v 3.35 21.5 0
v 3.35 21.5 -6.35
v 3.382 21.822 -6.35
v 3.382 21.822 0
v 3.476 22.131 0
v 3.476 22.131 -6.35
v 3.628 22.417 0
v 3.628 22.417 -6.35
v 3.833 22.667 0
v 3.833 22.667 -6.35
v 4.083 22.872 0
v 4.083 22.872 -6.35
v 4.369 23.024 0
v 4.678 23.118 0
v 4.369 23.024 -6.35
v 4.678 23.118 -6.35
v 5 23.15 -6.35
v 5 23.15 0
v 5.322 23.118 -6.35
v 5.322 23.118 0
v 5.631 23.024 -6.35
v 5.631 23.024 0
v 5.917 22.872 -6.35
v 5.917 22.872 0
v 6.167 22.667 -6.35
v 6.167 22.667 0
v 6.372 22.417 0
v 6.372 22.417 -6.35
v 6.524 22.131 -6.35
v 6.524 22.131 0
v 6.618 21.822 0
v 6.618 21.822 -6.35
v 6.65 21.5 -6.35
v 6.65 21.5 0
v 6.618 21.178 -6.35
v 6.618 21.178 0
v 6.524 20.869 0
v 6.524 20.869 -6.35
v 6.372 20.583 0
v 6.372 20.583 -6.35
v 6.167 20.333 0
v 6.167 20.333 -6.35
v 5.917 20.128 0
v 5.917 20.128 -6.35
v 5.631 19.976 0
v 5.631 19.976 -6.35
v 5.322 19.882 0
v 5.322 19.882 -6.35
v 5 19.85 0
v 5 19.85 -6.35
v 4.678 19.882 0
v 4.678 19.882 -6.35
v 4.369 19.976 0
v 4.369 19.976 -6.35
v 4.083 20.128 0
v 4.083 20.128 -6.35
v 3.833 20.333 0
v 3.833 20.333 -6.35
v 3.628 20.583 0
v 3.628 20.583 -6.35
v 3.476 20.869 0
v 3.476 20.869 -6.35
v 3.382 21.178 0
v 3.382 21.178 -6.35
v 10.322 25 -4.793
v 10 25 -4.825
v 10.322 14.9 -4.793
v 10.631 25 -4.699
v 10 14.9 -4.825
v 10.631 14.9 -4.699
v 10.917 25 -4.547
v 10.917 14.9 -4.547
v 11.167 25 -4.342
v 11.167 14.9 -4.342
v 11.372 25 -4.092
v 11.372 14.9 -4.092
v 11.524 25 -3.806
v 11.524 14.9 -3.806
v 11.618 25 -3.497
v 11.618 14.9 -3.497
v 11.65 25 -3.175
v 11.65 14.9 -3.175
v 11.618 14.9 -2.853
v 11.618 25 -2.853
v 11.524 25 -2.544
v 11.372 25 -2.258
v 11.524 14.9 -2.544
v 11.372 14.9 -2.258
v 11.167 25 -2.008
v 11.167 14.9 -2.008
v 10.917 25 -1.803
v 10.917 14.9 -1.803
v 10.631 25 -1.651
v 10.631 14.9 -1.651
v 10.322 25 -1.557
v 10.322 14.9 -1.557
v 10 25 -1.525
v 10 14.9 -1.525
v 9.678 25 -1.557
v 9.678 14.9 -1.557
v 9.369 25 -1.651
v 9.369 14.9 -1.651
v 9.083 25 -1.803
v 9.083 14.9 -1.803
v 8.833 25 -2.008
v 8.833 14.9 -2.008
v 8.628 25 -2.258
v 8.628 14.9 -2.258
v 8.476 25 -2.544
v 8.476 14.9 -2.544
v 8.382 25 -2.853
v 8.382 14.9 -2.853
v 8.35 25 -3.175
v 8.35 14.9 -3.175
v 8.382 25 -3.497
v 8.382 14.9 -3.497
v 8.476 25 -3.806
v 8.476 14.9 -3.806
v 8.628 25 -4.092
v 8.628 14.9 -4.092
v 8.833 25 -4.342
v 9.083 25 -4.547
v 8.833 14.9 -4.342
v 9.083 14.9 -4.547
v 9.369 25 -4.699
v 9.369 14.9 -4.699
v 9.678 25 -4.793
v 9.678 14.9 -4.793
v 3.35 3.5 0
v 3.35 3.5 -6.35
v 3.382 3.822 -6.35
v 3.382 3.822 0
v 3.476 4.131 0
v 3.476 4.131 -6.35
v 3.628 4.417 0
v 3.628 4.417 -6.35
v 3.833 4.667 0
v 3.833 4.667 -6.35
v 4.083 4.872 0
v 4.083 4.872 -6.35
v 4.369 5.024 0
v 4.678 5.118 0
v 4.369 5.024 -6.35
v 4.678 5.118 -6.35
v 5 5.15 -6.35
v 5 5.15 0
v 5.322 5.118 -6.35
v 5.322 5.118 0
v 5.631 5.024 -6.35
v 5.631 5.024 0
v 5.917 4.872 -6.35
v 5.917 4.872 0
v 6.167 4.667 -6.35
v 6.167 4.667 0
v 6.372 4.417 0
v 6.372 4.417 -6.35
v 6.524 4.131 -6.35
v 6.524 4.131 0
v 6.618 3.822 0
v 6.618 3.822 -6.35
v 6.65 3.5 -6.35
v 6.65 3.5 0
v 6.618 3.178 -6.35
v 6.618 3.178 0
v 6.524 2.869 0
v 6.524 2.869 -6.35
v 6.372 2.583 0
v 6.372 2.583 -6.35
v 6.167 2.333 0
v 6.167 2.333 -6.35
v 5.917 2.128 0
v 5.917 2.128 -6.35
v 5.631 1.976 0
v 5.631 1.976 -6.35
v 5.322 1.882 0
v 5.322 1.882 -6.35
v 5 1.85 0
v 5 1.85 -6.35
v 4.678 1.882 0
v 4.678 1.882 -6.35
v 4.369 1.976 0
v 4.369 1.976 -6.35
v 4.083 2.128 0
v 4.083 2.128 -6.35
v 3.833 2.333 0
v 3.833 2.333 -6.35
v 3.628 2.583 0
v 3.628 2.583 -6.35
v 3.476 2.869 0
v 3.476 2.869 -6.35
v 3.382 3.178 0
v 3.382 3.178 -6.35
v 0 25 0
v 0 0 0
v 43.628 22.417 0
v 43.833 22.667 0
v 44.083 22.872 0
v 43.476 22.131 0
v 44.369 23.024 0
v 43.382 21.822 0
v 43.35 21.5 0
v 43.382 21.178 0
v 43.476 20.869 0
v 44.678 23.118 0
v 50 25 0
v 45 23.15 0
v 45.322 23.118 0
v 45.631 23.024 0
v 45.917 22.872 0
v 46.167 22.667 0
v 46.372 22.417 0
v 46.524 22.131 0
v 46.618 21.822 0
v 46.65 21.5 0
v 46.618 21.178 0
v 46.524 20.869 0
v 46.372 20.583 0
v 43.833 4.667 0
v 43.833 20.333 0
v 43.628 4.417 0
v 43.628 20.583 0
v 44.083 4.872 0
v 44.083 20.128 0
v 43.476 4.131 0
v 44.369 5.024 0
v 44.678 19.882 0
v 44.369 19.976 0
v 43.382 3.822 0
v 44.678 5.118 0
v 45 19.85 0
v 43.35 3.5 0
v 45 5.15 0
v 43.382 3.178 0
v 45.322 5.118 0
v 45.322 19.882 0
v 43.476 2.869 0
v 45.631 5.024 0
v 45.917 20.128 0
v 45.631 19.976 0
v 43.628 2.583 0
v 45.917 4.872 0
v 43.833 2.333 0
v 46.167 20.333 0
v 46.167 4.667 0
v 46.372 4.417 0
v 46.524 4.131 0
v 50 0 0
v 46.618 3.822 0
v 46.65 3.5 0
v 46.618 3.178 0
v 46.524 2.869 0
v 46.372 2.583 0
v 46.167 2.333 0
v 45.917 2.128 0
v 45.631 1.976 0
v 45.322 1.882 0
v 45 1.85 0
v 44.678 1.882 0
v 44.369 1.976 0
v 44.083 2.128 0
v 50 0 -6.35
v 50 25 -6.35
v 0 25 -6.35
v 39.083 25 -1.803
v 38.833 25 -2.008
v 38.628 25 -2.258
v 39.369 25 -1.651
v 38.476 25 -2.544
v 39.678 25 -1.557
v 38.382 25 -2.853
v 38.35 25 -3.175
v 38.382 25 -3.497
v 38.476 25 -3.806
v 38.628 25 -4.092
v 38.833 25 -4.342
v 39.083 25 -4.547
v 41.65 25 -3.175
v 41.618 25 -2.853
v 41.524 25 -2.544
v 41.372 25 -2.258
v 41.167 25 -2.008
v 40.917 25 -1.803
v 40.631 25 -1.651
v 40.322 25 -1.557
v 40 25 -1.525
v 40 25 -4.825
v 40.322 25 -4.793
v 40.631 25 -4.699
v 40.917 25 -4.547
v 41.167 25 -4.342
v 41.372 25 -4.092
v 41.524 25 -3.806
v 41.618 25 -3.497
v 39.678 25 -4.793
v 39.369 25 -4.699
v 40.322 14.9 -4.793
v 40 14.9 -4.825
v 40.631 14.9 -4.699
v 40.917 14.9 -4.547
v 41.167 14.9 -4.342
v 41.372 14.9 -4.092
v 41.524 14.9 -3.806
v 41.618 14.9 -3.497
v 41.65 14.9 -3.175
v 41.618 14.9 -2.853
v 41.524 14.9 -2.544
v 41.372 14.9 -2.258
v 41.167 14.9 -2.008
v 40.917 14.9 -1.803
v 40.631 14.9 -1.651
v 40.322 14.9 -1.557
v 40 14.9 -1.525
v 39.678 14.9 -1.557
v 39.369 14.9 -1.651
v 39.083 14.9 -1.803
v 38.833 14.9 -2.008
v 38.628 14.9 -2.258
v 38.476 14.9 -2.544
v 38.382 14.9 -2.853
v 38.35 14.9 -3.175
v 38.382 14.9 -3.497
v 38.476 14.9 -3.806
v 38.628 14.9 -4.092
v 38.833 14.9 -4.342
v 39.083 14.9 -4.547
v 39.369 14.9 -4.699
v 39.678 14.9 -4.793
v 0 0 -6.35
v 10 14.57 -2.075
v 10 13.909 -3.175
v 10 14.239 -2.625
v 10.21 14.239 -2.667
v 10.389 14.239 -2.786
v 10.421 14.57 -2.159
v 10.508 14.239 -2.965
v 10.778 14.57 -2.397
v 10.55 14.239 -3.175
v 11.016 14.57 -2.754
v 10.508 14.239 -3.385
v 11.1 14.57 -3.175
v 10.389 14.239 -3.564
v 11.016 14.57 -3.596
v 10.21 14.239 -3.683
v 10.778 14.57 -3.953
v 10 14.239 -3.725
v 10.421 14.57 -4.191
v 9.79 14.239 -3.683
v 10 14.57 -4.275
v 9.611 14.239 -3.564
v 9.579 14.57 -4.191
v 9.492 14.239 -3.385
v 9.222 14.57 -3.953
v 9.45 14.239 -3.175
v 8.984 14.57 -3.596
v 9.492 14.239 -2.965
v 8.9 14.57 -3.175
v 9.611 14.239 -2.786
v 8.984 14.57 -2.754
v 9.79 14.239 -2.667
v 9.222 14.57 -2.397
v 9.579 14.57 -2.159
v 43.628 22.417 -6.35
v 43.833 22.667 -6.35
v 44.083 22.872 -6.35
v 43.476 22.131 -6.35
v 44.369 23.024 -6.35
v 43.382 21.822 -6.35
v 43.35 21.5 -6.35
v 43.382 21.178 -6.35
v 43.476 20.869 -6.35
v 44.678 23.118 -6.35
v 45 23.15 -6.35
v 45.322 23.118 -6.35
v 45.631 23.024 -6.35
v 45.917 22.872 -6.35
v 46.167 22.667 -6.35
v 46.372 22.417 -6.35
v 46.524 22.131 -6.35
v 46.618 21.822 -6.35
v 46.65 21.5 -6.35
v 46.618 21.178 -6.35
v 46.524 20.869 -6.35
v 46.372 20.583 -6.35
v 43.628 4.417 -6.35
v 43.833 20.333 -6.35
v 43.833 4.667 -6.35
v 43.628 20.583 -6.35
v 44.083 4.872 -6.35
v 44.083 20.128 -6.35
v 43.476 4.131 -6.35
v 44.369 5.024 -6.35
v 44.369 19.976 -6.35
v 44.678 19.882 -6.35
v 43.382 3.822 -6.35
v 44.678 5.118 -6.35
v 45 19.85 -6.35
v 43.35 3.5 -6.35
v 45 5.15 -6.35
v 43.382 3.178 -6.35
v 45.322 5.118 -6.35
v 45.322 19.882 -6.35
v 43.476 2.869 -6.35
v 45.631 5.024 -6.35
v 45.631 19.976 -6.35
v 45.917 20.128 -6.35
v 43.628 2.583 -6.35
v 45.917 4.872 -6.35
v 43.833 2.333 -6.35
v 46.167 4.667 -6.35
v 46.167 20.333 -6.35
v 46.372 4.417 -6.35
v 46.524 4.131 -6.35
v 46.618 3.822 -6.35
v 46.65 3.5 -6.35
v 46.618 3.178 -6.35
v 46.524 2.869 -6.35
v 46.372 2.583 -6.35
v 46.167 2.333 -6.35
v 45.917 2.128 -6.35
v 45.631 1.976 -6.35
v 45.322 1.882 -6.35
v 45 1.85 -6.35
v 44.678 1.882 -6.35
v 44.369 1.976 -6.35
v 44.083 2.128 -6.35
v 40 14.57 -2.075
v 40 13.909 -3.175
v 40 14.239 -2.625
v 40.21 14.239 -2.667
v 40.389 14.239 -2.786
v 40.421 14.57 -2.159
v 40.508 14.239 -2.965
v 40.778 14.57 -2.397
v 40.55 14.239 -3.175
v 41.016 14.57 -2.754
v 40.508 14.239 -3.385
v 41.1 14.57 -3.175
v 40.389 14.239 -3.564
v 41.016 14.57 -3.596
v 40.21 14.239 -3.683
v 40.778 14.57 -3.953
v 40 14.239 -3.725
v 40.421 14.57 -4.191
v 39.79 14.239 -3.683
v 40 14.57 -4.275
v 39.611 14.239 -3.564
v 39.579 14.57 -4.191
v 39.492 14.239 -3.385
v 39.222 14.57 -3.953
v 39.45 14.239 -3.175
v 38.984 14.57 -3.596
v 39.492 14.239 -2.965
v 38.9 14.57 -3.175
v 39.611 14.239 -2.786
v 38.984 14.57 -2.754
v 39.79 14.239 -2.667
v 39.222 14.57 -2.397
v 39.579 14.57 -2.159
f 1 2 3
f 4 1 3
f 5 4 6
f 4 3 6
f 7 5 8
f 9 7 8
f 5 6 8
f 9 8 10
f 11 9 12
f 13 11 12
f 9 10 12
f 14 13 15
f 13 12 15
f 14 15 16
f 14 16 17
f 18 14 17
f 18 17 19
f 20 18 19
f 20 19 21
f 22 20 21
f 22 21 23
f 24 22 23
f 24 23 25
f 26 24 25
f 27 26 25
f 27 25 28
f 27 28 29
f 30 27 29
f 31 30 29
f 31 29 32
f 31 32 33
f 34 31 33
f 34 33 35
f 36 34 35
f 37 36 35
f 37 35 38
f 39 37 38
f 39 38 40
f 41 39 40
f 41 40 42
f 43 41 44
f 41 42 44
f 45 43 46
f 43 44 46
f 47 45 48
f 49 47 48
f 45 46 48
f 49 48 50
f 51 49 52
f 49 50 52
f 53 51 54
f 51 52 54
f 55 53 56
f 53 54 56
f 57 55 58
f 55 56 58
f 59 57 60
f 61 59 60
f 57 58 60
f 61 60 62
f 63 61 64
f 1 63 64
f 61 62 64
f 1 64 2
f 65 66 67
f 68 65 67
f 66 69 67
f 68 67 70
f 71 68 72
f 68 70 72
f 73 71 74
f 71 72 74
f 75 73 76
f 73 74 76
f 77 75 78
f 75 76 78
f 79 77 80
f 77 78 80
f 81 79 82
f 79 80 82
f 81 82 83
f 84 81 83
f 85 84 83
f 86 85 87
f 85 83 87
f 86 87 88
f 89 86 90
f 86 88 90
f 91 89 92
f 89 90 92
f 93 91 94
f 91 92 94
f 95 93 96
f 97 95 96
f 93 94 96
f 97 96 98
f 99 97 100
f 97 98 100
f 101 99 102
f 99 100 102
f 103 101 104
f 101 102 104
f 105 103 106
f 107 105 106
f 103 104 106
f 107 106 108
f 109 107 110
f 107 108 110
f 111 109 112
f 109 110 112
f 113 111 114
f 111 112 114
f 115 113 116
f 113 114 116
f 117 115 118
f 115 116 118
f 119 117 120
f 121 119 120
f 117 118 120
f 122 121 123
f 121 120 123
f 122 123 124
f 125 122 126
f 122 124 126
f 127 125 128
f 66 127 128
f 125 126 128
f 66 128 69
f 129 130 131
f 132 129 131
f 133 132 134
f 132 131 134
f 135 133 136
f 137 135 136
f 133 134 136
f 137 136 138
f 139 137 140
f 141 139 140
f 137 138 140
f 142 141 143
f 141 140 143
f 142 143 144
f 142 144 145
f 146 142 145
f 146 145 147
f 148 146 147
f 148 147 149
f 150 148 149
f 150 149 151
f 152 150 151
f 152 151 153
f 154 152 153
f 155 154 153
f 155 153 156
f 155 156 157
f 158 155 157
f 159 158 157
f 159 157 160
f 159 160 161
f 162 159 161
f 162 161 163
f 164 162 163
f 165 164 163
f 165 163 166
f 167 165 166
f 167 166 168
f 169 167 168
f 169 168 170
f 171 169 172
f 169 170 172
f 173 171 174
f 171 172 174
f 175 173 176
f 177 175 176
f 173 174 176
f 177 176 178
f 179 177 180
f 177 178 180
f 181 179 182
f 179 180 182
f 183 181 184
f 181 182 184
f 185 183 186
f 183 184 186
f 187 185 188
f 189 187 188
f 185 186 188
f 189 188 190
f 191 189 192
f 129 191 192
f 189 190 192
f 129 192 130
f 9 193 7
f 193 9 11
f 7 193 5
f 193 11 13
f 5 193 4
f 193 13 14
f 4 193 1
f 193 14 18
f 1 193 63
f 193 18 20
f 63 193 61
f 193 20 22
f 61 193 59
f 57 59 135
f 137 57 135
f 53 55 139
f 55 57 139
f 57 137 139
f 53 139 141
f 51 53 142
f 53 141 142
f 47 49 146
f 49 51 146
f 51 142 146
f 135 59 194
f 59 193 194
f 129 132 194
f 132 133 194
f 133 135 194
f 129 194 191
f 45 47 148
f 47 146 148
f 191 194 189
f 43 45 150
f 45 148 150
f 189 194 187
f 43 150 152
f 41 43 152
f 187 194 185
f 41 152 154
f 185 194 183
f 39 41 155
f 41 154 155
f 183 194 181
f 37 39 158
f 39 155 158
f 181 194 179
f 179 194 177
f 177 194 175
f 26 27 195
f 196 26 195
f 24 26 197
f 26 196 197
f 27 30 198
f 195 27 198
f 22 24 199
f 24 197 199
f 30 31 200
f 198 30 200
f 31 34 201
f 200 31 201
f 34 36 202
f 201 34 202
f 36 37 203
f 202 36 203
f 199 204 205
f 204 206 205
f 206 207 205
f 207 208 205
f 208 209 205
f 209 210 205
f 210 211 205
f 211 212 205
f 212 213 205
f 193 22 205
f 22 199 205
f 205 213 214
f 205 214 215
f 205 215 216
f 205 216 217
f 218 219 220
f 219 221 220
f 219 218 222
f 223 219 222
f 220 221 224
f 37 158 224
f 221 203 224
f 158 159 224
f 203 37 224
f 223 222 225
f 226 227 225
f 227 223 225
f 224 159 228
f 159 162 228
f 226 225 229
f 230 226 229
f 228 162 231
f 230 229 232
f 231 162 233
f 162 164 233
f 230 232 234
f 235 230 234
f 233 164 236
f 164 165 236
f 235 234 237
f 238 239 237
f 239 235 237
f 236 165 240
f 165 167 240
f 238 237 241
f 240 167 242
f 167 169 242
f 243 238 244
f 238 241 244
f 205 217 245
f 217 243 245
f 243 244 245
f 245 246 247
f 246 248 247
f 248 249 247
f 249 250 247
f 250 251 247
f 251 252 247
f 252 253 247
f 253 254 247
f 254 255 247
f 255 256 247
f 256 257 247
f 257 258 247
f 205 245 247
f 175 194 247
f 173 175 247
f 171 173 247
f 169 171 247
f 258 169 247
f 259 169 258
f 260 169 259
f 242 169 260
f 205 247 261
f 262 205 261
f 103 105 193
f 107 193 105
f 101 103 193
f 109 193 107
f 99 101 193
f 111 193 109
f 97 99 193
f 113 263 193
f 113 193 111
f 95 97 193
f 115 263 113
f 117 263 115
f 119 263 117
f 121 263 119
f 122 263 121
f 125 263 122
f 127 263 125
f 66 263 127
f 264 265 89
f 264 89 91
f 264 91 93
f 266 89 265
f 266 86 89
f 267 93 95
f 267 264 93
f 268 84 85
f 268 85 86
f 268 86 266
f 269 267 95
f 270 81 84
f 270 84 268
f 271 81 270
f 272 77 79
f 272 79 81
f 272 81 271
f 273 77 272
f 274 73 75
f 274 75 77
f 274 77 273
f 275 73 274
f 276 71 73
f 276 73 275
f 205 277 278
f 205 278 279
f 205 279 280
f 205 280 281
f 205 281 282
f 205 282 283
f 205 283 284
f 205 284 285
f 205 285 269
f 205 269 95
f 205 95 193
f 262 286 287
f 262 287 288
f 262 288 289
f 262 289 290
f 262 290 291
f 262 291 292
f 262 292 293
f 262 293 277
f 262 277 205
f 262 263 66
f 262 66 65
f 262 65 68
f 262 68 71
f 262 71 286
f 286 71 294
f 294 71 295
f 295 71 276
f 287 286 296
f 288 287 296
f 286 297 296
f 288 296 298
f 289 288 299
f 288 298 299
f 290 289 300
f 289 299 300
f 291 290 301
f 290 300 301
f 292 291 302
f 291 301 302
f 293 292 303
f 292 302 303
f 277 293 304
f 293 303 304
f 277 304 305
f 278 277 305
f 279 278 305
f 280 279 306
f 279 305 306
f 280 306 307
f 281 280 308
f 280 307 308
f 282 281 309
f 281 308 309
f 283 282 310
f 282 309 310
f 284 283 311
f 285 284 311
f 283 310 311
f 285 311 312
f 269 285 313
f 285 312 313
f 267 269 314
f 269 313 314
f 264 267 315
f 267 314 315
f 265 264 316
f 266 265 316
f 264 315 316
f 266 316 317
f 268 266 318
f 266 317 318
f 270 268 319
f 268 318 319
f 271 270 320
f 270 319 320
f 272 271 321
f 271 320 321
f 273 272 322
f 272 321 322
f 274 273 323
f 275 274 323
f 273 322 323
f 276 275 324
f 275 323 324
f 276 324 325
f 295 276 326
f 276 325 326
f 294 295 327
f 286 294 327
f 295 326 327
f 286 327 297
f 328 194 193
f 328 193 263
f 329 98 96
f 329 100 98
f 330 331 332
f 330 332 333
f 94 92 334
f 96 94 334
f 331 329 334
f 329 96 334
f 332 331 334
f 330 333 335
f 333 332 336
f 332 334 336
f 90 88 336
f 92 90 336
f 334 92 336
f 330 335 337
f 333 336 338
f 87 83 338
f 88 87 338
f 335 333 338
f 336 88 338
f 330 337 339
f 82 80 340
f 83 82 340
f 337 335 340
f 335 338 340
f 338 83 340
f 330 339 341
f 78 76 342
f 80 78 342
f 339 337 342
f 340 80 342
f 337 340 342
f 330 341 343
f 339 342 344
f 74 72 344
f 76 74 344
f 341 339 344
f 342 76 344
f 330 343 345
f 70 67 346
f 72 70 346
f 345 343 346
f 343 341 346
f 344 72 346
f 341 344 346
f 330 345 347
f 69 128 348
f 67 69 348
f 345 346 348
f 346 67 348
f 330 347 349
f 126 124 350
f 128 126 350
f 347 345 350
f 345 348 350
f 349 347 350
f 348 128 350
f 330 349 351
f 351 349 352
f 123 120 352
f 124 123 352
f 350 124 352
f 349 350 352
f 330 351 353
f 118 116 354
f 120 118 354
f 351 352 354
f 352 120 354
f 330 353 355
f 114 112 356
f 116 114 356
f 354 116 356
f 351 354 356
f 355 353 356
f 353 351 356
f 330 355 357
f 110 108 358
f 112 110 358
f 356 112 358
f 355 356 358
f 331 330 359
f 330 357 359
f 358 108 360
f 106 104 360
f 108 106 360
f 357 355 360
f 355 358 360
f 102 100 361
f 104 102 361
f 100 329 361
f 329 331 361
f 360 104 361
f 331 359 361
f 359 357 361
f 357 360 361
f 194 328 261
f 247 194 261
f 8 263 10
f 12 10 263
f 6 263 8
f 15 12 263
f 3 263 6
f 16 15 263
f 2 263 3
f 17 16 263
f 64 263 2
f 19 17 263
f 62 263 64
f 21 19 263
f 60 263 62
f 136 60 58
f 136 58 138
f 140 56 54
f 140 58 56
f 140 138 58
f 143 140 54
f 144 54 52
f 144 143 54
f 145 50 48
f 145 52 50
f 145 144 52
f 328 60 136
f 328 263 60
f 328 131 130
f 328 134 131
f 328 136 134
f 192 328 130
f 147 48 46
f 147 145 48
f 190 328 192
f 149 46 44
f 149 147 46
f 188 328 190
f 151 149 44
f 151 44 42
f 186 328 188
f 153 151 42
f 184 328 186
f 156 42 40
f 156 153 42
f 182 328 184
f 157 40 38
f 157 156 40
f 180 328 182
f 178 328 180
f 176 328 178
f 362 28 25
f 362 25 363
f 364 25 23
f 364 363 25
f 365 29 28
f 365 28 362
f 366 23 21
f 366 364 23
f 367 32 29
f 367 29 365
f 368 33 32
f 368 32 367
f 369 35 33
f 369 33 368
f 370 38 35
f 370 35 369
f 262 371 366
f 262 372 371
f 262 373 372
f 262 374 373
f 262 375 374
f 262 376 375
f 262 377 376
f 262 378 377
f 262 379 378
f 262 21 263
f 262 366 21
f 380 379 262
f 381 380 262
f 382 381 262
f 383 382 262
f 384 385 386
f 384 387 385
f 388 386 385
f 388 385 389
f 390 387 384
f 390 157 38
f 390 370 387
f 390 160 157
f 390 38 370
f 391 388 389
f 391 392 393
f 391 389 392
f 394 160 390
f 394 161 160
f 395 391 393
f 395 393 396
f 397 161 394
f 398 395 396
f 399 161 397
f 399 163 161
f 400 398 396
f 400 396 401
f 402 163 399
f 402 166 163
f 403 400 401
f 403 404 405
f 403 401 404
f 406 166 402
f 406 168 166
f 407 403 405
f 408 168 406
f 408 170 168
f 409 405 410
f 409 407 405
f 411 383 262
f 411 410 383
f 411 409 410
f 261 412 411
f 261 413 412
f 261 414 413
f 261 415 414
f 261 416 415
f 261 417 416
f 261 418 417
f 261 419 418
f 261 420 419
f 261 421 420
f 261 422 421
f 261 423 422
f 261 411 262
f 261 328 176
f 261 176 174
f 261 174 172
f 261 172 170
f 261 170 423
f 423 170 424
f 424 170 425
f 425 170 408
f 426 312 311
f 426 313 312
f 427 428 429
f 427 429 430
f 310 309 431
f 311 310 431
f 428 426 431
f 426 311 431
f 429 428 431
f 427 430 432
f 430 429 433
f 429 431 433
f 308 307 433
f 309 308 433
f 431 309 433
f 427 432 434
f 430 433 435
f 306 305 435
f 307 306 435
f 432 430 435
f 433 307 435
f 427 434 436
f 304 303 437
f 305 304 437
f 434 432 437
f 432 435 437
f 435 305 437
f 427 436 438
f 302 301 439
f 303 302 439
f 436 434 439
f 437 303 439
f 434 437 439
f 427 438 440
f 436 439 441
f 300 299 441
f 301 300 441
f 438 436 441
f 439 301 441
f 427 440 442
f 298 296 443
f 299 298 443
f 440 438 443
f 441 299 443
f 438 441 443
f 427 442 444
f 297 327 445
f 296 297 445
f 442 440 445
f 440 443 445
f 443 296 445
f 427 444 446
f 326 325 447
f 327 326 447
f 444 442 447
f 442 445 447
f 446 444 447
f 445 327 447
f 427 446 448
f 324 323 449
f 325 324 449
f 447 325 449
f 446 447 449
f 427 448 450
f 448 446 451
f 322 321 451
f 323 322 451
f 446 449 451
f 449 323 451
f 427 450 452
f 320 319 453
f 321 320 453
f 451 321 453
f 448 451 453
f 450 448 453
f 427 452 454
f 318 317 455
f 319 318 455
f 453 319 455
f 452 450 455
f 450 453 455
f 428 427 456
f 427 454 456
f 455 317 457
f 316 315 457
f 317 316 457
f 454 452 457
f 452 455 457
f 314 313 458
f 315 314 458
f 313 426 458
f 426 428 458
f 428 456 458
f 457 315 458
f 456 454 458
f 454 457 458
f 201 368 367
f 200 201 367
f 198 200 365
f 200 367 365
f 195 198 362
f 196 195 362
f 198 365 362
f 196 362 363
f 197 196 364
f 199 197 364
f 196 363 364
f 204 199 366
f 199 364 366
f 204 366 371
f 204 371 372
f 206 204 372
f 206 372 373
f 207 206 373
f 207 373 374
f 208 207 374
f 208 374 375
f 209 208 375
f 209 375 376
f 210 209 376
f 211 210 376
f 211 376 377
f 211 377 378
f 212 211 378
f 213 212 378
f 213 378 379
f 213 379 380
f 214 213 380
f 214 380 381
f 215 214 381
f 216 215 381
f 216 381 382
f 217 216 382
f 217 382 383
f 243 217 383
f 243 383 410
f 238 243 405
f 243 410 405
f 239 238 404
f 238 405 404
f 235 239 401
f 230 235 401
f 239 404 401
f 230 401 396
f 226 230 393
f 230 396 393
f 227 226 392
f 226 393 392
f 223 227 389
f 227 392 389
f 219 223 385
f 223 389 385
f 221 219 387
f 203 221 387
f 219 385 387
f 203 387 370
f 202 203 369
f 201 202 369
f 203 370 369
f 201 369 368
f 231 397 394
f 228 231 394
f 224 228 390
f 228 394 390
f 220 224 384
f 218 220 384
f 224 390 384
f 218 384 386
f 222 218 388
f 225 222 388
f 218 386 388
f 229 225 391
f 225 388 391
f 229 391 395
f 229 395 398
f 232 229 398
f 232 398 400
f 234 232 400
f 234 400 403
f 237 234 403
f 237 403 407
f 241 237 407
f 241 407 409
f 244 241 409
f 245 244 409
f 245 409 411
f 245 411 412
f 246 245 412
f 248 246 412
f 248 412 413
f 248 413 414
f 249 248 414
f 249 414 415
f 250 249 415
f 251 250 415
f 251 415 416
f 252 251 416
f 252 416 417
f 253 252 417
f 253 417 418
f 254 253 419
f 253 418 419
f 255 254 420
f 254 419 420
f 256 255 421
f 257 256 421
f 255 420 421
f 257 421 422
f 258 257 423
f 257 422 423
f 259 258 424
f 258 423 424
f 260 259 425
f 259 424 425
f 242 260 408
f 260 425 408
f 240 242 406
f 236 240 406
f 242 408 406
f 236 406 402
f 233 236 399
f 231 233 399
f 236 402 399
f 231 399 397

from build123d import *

# Parameters (mm, degrees)
SKETCH1_W                 = 50
SKETCH1_H                 = 6.35
BOSS_EXTRUDE1_DEPTH       = 25
M4X0_7_TAPPED_HOLE1_D     = 3.3
M4X0_7_TAPPED_HOLE1_DEPTH = 10.1
M4X0_7_TAPPED_HOLE1_TIP   = 0.991420021
M4X0_7_TAPPED_HOLE2_D     = 3.3
M4X0_7_TAPPED_HOLE2_DEPTH = 10.1
M4X0_7_TAPPED_HOLE2_TIP   = 0.991420021


with BuildPart() as part:
    # Sketch1 → Boss-Extrude1 (new body)
    with BuildSketch(Plane(origin=(0, 0, 0), x_dir=(1, 0, 0), z_dir=(0, 1, 0))):
        with Locations((25, 3.175)):
            Rectangle(SKETCH1_W, SKETCH1_H)
    extrude(amount=BOSS_EXTRUDE1_DEPTH)

    # M4x0.7 Tapped Hole1
    with Locations(Plane(origin=(40, 25, -3.175), x_dir=(0, 0, 1), z_dir=(0, 1, 0))):
        with Locations((0, 0), (0, -30)):
            Hole(M4X0_7_TAPPED_HOLE1_D / 2, depth=M4X0_7_TAPPED_HOLE1_DEPTH)
            with Locations((0, 0, -(M4X0_7_TAPPED_HOLE1_DEPTH + M4X0_7_TAPPED_HOLE1_TIP / 2))):  # 118° drill point
                Cone(0, M4X0_7_TAPPED_HOLE1_D / 2, M4X0_7_TAPPED_HOLE1_TIP, mode=Mode.SUBTRACT)

    # M4x0.7 Tapped Hole2
    with Locations(Plane(origin=(5, 21.5, 0), x_dir=(1, 0, 0), z_dir=(0, 0, 1))):
        with Locations((0, 0), (40, 0), (40, -18), (0, -18)):
            Hole(M4X0_7_TAPPED_HOLE2_D / 2, depth=M4X0_7_TAPPED_HOLE2_DEPTH)
            with Locations((0, 0, -(M4X0_7_TAPPED_HOLE2_DEPTH + M4X0_7_TAPPED_HOLE2_TIP / 2))):  # 118° drill point
                Cone(0, M4X0_7_TAPPED_HOLE2_D / 2, M4X0_7_TAPPED_HOLE2_TIP, mode=Mode.SUBTRACT)


solid = part.part
